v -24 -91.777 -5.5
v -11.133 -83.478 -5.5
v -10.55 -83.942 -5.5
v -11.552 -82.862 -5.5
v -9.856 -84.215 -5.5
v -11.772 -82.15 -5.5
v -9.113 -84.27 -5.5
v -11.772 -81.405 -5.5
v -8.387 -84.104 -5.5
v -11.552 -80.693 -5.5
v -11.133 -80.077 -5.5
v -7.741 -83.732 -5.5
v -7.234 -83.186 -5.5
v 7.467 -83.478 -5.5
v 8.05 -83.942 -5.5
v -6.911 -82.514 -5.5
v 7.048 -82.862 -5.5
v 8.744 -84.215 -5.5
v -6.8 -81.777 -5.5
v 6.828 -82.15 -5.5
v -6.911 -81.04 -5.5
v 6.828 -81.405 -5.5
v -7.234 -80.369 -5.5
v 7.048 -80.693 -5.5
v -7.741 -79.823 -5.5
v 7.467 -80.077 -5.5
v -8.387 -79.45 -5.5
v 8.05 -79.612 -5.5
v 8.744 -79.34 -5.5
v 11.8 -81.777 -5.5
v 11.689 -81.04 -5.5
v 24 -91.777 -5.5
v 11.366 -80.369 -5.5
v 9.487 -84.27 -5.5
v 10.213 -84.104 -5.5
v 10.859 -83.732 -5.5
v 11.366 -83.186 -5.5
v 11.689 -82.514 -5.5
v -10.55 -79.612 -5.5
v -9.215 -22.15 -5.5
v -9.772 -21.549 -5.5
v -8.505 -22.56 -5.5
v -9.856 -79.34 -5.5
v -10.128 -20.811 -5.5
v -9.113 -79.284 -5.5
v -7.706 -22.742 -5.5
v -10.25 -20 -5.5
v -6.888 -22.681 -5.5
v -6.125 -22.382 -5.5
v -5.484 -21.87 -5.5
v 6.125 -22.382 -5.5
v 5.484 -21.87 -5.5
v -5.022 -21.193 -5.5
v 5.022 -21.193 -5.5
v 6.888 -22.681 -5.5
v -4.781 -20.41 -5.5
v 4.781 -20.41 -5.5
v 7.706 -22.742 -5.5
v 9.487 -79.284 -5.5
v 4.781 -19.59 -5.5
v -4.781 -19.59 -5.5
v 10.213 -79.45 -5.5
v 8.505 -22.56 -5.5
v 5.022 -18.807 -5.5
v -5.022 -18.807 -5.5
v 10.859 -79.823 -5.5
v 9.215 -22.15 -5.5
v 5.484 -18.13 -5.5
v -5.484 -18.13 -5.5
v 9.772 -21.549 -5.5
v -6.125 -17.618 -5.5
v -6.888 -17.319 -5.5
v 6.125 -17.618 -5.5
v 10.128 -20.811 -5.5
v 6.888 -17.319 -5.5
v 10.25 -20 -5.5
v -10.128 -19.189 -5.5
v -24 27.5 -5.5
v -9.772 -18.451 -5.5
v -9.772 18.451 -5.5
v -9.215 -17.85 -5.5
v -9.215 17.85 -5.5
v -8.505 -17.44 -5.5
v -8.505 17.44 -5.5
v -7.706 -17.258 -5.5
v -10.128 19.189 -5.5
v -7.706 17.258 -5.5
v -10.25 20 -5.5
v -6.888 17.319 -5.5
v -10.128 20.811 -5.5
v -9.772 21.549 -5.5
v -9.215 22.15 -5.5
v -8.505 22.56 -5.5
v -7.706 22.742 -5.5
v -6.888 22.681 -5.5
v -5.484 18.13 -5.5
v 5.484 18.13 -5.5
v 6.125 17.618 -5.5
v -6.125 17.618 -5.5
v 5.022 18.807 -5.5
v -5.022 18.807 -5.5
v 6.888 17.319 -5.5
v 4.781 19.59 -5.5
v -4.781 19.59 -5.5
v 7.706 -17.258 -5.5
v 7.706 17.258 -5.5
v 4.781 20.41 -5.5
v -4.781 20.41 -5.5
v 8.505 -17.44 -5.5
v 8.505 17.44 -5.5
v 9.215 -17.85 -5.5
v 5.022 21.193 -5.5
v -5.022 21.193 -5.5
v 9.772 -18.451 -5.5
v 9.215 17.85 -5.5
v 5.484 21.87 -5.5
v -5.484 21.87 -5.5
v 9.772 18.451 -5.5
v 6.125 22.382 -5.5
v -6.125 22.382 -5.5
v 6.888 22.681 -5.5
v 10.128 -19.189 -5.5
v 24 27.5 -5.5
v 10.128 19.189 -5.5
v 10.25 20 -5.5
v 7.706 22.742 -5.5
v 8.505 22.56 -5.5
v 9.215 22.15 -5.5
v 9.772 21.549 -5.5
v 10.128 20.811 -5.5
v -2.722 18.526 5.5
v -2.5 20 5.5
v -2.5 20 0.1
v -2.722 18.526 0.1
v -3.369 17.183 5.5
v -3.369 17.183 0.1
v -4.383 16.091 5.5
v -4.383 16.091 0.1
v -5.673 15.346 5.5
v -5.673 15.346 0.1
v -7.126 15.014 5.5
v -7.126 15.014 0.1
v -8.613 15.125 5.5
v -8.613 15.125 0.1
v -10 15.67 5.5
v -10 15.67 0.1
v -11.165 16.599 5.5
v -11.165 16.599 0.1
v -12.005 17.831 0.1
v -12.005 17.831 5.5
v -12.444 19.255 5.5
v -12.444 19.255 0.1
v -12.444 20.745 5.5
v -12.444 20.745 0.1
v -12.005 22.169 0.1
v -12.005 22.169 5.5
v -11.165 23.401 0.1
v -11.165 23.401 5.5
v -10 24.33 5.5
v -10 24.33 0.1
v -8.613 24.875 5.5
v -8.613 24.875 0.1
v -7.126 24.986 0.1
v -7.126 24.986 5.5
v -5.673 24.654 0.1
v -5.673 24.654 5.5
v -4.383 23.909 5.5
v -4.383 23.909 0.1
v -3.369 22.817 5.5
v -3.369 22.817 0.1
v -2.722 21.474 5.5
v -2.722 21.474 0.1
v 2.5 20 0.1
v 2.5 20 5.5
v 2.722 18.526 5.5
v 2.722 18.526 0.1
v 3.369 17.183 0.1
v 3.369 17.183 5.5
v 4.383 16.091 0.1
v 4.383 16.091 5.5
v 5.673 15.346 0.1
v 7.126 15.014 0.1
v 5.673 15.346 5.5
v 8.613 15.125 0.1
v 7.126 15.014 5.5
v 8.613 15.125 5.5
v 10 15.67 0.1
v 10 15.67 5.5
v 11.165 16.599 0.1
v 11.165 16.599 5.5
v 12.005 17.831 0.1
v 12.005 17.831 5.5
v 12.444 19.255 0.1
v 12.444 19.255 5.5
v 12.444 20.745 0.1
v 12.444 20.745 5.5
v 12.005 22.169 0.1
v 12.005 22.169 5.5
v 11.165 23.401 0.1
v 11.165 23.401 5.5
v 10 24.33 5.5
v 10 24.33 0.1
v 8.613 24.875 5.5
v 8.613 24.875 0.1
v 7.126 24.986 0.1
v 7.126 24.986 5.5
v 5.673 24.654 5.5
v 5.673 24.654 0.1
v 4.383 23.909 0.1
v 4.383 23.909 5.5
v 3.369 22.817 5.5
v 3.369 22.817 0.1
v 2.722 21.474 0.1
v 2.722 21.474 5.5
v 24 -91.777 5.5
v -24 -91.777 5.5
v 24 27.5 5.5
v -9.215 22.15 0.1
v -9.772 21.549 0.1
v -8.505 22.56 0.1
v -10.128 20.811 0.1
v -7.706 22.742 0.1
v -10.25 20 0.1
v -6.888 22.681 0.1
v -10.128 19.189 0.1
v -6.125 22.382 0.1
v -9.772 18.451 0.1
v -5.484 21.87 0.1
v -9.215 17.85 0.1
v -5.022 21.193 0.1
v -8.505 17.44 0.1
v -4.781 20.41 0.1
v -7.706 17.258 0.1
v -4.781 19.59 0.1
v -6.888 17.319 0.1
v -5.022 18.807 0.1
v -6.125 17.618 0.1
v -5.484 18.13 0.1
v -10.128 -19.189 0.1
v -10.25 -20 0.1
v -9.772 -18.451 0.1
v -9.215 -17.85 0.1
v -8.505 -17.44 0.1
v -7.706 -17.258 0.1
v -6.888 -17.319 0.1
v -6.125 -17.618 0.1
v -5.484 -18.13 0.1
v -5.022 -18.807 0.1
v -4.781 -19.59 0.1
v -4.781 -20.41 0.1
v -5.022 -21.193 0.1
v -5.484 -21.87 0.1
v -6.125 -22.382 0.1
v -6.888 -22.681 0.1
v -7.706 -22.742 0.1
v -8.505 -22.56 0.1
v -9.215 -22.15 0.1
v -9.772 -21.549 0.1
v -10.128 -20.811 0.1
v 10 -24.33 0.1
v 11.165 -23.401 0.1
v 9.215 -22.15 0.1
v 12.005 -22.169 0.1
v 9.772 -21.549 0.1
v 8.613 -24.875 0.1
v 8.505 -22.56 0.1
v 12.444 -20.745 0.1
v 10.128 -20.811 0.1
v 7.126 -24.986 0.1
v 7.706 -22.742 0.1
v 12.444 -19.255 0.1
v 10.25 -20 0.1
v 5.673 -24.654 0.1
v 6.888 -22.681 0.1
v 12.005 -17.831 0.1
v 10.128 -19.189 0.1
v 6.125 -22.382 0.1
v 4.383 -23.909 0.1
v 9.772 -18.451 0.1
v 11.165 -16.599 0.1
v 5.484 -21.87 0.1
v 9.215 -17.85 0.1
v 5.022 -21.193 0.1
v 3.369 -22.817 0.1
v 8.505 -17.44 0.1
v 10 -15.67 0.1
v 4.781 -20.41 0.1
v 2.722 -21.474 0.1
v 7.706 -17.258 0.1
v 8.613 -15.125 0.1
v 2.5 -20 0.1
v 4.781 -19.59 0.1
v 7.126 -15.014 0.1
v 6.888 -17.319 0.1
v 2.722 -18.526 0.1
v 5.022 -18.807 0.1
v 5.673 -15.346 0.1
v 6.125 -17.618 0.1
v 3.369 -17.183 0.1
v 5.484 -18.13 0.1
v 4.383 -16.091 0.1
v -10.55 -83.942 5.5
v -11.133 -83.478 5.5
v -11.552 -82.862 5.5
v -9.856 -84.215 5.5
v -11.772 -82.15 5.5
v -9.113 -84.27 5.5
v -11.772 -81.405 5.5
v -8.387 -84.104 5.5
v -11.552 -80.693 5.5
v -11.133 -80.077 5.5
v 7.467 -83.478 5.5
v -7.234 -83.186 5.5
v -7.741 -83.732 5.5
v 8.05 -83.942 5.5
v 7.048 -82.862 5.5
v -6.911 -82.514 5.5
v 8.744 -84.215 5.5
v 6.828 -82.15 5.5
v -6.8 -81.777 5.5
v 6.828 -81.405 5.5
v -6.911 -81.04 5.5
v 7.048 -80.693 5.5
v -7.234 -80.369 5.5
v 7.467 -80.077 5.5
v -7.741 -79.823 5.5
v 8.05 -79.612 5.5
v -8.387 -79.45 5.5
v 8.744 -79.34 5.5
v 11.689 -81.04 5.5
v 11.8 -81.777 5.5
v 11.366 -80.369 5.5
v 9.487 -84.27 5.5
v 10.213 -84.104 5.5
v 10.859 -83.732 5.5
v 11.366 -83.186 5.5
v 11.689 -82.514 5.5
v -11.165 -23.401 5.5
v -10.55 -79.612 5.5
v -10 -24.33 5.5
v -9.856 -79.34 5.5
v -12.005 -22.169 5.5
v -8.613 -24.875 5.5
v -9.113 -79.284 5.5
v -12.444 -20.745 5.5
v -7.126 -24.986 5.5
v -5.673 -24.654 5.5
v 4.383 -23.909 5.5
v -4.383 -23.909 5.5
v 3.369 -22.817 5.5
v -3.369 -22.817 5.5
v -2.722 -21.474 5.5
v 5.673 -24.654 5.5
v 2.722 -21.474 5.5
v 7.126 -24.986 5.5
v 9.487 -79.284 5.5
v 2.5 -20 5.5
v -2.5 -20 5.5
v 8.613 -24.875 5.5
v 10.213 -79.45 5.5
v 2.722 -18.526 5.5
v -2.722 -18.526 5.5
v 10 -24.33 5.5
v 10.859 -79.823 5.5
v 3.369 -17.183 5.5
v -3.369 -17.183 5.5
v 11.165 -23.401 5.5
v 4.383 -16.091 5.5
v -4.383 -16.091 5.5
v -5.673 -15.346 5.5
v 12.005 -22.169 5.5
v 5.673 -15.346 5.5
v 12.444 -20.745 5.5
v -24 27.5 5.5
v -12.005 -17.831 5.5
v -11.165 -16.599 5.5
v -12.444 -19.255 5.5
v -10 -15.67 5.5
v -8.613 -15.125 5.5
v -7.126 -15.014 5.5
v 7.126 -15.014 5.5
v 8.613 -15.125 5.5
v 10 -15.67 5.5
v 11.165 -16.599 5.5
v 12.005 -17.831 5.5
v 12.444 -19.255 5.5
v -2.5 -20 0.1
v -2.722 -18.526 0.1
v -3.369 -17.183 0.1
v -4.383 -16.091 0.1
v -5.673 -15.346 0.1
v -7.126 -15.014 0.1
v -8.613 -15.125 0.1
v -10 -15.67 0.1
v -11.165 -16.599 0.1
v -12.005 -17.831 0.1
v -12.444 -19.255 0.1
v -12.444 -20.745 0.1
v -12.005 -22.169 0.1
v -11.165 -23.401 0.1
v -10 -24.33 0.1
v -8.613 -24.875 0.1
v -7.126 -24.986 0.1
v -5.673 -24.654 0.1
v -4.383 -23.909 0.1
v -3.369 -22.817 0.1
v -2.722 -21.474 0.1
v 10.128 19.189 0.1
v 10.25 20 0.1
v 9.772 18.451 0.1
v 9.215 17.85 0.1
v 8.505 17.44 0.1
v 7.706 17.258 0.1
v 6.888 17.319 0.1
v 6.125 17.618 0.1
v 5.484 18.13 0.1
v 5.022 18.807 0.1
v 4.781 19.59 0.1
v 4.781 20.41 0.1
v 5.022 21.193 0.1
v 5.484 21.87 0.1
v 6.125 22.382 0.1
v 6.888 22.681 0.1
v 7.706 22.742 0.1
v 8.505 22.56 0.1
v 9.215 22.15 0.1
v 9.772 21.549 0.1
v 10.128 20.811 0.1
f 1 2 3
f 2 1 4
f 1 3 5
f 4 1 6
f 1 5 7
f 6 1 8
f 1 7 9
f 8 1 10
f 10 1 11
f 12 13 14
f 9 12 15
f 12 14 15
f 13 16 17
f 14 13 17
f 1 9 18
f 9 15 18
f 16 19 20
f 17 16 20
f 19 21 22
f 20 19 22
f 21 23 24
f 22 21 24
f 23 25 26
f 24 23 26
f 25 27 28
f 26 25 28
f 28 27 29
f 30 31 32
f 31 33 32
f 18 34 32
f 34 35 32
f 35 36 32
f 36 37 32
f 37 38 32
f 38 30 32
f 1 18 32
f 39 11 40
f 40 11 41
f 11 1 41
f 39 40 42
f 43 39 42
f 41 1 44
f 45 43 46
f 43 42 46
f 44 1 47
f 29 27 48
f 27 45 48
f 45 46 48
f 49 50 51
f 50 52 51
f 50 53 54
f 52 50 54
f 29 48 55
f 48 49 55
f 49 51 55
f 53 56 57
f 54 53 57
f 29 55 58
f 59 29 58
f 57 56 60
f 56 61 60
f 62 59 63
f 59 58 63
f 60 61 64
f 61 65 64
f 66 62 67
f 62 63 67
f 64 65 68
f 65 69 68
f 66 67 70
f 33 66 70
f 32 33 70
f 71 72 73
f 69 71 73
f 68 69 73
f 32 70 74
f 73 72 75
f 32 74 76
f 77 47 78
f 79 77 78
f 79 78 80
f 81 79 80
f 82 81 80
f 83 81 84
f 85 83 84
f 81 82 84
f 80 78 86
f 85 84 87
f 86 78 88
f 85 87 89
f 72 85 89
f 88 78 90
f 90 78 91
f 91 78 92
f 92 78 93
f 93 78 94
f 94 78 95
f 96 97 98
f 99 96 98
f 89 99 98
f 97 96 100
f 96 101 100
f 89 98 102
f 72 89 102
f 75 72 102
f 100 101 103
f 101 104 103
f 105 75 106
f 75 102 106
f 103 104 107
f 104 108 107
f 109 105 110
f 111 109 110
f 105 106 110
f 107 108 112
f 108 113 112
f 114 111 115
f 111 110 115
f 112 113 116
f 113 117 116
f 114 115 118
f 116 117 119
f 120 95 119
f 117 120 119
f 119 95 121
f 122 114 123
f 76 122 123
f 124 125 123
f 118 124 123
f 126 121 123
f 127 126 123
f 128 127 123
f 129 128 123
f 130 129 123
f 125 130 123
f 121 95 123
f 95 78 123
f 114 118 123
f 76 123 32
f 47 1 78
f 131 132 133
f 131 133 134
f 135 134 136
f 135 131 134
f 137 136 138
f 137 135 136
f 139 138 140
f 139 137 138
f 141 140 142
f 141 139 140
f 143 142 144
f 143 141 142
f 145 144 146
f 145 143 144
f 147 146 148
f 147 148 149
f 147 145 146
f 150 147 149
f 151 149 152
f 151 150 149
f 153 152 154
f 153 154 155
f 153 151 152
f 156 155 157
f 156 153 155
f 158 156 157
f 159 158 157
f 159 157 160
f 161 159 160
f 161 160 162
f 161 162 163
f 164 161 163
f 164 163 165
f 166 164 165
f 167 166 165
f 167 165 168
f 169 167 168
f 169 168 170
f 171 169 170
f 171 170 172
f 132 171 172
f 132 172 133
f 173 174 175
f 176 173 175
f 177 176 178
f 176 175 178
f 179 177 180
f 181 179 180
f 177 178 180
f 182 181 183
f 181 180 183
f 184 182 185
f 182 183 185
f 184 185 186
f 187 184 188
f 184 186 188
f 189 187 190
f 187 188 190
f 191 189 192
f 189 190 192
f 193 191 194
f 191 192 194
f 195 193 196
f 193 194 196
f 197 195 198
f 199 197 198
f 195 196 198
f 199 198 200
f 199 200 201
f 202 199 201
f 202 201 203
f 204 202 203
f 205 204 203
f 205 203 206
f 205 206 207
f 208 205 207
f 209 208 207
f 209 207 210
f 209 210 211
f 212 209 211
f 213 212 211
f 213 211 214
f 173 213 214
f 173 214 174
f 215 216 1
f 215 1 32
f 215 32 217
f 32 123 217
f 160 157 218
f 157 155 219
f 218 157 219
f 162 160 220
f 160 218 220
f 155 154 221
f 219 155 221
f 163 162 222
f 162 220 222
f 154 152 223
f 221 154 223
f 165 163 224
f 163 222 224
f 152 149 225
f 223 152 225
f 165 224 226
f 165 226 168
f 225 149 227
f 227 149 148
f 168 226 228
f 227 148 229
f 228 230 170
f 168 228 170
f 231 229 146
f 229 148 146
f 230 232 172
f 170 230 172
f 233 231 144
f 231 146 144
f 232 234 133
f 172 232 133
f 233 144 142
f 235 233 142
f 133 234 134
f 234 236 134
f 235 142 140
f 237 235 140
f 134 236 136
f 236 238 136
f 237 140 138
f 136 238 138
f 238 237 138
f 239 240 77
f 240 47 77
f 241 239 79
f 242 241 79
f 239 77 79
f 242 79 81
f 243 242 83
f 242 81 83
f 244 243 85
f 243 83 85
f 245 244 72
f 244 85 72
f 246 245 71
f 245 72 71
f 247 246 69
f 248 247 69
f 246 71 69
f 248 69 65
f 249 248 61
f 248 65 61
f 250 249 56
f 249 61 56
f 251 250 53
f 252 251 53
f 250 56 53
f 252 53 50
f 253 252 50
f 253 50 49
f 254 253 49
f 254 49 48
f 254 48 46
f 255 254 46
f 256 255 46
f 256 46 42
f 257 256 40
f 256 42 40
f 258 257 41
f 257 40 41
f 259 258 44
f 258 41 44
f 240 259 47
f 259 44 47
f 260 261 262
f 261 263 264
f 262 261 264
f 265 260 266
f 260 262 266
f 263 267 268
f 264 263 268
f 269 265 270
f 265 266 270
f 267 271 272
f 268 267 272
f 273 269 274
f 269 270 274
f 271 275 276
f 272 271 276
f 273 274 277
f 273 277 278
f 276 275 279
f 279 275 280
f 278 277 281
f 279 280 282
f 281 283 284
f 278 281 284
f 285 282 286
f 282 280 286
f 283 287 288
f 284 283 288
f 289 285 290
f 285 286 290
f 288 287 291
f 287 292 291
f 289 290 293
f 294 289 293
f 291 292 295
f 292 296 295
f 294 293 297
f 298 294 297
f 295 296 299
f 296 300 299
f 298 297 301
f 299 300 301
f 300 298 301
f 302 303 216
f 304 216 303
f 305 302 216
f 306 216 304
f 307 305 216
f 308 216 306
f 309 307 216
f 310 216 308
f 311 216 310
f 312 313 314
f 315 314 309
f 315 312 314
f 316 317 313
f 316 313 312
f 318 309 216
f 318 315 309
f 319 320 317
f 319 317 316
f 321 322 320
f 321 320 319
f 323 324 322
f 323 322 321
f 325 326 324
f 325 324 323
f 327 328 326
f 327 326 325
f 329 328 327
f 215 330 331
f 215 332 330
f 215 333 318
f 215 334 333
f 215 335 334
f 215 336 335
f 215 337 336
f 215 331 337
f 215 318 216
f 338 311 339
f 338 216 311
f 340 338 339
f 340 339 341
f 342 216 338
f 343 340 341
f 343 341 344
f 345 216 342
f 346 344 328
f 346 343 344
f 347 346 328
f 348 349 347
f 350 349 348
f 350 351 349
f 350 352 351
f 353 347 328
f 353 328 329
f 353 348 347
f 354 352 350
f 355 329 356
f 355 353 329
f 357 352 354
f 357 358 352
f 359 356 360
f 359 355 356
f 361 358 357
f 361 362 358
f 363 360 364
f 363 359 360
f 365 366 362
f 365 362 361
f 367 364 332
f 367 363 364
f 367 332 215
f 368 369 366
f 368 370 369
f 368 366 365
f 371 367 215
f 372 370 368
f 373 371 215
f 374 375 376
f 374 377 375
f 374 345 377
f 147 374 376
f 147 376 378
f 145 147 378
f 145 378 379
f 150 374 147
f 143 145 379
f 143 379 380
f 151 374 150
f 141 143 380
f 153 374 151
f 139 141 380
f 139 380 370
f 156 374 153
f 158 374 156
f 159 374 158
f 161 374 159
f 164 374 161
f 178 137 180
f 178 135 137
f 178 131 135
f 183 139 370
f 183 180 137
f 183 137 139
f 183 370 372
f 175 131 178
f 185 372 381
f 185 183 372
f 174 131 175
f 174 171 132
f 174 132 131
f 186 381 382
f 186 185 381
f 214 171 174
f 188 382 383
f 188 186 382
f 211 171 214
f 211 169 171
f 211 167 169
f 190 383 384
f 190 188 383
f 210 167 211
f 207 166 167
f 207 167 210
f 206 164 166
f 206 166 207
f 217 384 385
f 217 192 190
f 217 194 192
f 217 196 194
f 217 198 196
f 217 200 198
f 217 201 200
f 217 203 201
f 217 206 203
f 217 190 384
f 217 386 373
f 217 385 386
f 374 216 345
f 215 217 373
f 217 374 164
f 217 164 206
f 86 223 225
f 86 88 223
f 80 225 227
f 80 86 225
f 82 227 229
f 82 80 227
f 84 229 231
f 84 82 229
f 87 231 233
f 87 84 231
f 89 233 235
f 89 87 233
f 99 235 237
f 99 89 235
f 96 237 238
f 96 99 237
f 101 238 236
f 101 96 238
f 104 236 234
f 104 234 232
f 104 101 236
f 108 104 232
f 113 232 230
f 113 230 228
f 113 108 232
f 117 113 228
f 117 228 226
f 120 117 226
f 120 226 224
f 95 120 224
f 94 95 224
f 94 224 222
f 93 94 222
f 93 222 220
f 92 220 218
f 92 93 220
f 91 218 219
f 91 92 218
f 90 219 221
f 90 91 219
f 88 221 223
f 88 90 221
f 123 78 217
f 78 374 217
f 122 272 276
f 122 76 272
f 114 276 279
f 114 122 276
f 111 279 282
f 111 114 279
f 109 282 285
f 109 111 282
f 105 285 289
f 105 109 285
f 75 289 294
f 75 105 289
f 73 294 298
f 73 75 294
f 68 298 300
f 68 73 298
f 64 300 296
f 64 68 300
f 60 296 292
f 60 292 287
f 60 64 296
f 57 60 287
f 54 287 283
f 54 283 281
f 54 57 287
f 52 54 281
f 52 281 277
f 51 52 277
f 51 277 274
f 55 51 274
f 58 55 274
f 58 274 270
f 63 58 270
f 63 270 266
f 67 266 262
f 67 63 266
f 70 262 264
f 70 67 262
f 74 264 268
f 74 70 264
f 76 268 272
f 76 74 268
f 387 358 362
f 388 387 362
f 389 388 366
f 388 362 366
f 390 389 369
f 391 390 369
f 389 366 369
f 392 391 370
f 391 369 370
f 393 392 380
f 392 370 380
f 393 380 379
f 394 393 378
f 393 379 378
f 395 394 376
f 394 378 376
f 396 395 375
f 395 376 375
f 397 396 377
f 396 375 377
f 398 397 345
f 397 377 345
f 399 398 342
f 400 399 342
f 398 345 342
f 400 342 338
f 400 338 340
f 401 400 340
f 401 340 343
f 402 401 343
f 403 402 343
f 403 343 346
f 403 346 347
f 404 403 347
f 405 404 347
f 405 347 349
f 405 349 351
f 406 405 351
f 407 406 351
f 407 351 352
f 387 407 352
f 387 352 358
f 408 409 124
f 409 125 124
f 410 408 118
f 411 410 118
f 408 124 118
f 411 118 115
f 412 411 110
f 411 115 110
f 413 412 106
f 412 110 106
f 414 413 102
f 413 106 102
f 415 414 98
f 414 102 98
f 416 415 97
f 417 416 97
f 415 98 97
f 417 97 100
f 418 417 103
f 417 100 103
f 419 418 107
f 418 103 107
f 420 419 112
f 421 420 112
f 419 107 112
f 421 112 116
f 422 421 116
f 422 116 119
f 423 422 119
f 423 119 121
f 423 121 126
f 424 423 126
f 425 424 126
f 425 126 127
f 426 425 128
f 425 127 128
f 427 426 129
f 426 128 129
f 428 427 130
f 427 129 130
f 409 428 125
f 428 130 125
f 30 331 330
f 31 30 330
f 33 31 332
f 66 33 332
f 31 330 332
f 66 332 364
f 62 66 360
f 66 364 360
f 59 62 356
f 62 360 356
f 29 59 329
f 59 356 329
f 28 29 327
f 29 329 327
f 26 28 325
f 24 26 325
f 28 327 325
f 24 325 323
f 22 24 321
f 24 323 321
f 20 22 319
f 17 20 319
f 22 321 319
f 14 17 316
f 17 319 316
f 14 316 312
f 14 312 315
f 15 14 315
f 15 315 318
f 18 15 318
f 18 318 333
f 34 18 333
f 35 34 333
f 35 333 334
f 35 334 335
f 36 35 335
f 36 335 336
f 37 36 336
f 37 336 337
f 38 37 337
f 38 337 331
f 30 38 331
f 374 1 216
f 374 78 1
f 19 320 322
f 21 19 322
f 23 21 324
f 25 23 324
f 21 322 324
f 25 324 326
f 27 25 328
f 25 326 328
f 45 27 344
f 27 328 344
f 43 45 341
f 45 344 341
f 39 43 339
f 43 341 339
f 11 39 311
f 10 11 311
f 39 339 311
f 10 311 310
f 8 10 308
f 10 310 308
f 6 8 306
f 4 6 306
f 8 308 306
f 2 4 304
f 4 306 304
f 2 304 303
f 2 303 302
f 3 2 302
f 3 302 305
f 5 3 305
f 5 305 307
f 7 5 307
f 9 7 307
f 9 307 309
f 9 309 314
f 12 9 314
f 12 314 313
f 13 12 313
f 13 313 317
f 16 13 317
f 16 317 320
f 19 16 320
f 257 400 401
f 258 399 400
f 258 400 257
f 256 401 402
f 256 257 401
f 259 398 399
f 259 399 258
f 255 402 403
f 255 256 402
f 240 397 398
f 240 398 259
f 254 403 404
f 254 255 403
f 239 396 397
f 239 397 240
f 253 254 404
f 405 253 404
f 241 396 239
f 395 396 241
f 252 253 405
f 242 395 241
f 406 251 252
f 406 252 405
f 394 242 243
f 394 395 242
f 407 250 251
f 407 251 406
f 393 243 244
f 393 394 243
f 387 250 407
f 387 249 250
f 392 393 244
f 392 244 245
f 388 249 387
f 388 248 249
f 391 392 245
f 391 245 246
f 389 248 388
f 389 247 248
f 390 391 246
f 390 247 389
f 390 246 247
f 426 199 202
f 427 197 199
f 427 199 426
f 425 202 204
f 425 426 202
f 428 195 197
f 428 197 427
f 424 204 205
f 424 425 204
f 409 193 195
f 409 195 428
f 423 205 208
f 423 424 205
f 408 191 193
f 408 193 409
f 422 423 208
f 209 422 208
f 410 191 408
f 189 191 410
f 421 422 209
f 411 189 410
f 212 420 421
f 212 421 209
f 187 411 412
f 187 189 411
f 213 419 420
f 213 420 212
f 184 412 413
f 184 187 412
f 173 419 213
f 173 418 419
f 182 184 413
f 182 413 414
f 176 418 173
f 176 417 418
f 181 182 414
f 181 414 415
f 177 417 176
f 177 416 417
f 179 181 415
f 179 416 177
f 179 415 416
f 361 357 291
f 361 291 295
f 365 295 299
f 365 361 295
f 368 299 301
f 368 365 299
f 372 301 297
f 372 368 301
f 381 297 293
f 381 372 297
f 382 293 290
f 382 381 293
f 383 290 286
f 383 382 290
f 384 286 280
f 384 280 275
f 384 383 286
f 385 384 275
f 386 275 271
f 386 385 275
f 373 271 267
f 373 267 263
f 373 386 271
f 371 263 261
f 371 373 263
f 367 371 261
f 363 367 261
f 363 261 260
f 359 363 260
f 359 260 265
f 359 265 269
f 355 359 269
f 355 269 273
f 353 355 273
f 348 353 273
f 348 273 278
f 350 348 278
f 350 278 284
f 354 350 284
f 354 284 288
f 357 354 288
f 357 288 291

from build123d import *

# Parameters (mm, degrees)
SKETCH_1_W                   = 48
SKETCH_1_H                   = 55
EXTRUDE_1_DEPTH              = 5.5
HOLE_WIZARD_M5_1_D           = 5.5
HOLE_WIZARD_M5_1_CBORE_D     = 10
HOLE_WIZARD_M5_1_CBORE_DEPTH = 5.4
MIRROR_2_COPY_1_D            = 5.5
MIRROR_2_COPY_1_CBORE_D      = 10
MIRROR_2_COPY_1_CBORE_DEPTH  = 5.4
SKETCH_4_W                   = 48
SKETCH_4_H                   = 11
EXTRUDE_2_DEPTH              = 64.277224085
SKETCH_5_R                   = 2.5
CUT_EXTRUDE_1_DEPTH          = 96.498999266


with BuildPart() as part:
    # 草图1 → 凸台-拉伸1 (new, symmetric)
    with BuildSketch(Plane.XY):
        Rectangle(SKETCH_1_W, SKETCH_1_H)
    extrude(amount=EXTRUDE_1_DEPTH, both=True)

    # M5 六角凹头螺钉的柱形沉头孔1 (through all)
    with Locations(Plane(origin=(-7.5, -20, 5.5), x_dir=(1, 0, 0), z_dir=(0, 0, 1))):
        with Locations((0, 0)):
            hole_wizard_m5_1 = CounterBoreHole(HOLE_WIZARD_M5_1_D / 2, HOLE_WIZARD_M5_1_CBORE_D / 2, HOLE_WIZARD_M5_1_CBORE_DEPTH)

    # 镜向1: M5 六角凹头螺钉的柱形沉头孔1 across plane
    add(hole_wizard_m5_1.mirror(Plane(origin=(0, 0, 0), x_dir=(0, 0, 1), z_dir=(1, 0, 0))), mode=Mode.SUBTRACT)

    # 镜向2: M5 六角凹头螺钉的柱形沉头孔1 across plane
    add(hole_wizard_m5_1.mirror(Plane.ZX), mode=Mode.SUBTRACT)

    # 镜向2 copy 1 (through all)
    with Locations(Plane(origin=(7.5, 20, 5.5), x_dir=(-1, 0, 0), z_dir=(0, 0, 1))):
        with Locations((0, 0)):
            CounterBoreHole(MIRROR_2_COPY_1_D / 2, MIRROR_2_COPY_1_CBORE_D / 2, MIRROR_2_COPY_1_CBORE_DEPTH)

    # 草图4 → 凸台-拉伸2 (add)
    with BuildSketch(Plane.XZ.offset(27.5)):
        Rectangle(SKETCH_4_W, SKETCH_4_H)
    extrude(amount=EXTRUDE_2_DEPTH)

    # 草图5 → 切除-拉伸1 (cut, through all)
    with BuildSketch(Plane.XY.offset(5.5)):
        with Locations((-9.3, -81.777224085)):
            Circle(SKETCH_5_R)
        with Locations((9.3, -81.777224085)):
            Circle(SKETCH_5_R)
    extrude(amount=-CUT_EXTRUDE_1_DEPTH, mode=Mode.SUBTRACT)


solid = part.part
